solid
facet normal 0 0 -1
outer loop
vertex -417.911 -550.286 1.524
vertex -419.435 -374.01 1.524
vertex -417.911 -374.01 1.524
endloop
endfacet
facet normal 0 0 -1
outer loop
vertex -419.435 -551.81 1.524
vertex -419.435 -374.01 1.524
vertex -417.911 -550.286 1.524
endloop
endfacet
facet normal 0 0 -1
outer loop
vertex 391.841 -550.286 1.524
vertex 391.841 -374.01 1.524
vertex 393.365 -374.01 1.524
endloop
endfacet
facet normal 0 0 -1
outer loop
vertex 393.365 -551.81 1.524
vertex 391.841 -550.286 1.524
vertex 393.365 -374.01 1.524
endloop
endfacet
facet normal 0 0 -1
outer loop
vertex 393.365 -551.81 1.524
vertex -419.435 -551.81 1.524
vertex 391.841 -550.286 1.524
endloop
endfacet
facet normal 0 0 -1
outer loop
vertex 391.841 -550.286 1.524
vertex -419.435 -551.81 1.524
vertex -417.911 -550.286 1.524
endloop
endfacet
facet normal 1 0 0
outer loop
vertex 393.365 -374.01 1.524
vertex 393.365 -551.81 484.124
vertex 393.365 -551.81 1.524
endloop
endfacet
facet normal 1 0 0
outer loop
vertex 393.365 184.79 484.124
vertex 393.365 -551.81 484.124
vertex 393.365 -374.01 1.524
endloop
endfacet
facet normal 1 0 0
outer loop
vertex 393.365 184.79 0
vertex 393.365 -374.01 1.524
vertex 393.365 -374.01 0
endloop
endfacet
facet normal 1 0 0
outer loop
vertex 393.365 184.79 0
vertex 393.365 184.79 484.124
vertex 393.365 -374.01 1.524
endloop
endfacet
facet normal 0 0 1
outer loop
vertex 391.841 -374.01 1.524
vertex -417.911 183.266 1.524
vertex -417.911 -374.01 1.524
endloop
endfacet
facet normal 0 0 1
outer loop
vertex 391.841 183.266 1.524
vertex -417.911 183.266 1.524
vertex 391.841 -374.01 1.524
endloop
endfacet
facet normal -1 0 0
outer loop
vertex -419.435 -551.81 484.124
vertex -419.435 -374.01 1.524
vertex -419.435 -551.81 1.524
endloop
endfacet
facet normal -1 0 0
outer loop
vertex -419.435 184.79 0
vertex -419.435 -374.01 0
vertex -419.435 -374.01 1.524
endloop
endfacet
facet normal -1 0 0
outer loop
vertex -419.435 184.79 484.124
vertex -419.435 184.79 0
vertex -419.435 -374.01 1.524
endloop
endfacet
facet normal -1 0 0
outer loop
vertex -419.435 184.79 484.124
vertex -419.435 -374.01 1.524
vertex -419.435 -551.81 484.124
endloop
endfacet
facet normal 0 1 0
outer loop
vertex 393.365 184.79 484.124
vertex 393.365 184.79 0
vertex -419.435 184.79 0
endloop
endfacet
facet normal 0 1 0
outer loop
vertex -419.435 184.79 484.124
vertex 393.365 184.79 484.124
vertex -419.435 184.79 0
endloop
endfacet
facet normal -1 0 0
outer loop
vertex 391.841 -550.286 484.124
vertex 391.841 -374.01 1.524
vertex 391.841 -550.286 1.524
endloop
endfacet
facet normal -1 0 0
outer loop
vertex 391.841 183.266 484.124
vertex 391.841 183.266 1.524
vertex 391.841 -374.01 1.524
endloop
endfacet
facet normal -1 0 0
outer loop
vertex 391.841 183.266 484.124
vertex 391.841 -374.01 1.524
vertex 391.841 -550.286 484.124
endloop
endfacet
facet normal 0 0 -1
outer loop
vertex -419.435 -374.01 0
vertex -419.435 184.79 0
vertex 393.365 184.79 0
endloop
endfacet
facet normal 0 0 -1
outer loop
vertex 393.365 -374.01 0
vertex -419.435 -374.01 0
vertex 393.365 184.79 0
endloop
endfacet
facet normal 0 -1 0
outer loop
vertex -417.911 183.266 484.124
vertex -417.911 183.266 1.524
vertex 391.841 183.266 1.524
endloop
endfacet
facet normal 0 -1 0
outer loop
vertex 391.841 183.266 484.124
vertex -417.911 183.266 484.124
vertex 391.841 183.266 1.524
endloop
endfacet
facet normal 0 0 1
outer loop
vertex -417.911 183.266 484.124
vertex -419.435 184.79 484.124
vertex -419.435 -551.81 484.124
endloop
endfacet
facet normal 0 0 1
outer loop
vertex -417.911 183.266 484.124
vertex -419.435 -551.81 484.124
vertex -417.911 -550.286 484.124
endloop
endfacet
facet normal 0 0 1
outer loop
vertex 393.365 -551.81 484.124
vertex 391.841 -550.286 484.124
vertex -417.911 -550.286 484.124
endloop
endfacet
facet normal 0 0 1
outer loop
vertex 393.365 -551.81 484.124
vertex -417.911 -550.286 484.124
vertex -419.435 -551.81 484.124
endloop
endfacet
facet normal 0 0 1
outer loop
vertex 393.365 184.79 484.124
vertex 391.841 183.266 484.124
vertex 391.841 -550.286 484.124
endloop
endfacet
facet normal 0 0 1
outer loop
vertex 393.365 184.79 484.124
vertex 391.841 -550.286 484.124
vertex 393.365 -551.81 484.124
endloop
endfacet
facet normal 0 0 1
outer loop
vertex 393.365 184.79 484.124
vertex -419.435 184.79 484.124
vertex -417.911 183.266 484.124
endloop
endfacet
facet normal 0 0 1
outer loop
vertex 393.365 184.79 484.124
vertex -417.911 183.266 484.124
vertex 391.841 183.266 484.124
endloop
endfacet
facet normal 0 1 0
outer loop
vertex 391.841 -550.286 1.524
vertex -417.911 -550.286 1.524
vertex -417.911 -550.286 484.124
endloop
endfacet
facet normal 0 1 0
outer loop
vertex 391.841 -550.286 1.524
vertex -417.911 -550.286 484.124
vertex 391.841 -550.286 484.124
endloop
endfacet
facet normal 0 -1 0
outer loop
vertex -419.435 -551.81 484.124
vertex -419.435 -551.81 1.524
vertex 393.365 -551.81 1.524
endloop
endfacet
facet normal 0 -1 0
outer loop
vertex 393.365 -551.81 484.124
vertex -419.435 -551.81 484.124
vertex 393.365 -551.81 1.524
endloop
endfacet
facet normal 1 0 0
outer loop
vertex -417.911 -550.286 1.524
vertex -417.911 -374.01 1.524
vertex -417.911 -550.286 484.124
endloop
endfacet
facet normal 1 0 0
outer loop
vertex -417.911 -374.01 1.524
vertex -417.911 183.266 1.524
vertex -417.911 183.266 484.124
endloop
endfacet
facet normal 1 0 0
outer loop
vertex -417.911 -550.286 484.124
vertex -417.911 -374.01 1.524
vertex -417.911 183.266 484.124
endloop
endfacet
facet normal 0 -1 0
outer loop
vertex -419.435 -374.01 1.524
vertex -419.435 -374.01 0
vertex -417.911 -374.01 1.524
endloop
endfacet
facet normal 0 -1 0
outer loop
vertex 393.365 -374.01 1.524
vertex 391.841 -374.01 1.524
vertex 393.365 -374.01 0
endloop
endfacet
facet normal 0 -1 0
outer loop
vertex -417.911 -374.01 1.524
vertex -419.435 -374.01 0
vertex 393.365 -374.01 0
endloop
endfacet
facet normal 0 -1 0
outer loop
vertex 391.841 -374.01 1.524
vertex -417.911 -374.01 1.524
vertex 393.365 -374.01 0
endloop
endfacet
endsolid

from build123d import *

# Parameters (mm, degrees)
F0_W     = 812.8
F0_H     = 482.6
F1_DEPTH = 1.524
F2_W     = 809.752
F2_H     = 1.524
F3_DEPTH = 482.6
F4_DEPTH = 254
F5_DEPTH = 254
F6_W     = 812.8
F6_H     = 177.8
F7_DEPTH = 1.524


with BuildPart() as f1:
    # F0 (on Top) → F1 (new body)
    with BuildSketch(Plane.XY):
        with Locations((-13.0345858634, -56.5100638679)):
            Rectangle(F0_W, F0_H)
    extrude(amount=F1_DEPTH)

    # F2 (on face) → F3 (join)
    with BuildSketch(Plane.XY.offset(1.524)):
        Polygon((393.3654141366, 184.7899361321), (391.8414141366, 184.7899361321), (391.8414141366, 183.2659361321), (391.8414141366, -296.2860638679), (391.8414141366, -297.8100638679), (393.3654141366, -297.8100638679), align=None)
        with Locations((-13.0345858634, 184.0279361321)):
            Rectangle(F2_W, F2_H)
        with Locations((-13.0345858634, -297.0480638679)):
            Rectangle(F2_W, F2_H)
        Polygon((-417.9105858634, 184.7899361321), (-419.4345858634, 184.7899361321), (-419.4345858634, -297.8100638679), (-417.9105858634, -297.8100638679), (-417.9105858634, -296.2860638679), (-417.9105858634, 183.2659361321), align=None)
    extrude(amount=F3_DEPTH)

    # F4 (add): a face of the model
    f4_faces = [f1.faces().sort_by_distance(p)[0] for p in [
        (-13.0345858634, -297.8100638679, 242.062),
    ]]
    extrude(f4_faces, amount=F4_DEPTH)

    # F5 (cut): a face of the model
    f5_faces = [f1.faces().sort_by_distance(p)[0] for p in [
        (-13.0345858634, -296.2860638679, 242.824),
    ]]
    extrude(f5_faces, amount=-F5_DEPTH, mode=Mode.SUBTRACT)

    # F6 (on face) → F7 (cut)
    with BuildSketch(Plane(origin=(0, 0, 0), x_dir=(1, 0, 0), z_dir=(0, 0, -1))):
        with Locations((-13.0345858634, 462.9100638679)):
            Rectangle(F6_W, F6_H)
    extrude(amount=-F7_DEPTH, mode=Mode.SUBTRACT)


solid = f1.part
